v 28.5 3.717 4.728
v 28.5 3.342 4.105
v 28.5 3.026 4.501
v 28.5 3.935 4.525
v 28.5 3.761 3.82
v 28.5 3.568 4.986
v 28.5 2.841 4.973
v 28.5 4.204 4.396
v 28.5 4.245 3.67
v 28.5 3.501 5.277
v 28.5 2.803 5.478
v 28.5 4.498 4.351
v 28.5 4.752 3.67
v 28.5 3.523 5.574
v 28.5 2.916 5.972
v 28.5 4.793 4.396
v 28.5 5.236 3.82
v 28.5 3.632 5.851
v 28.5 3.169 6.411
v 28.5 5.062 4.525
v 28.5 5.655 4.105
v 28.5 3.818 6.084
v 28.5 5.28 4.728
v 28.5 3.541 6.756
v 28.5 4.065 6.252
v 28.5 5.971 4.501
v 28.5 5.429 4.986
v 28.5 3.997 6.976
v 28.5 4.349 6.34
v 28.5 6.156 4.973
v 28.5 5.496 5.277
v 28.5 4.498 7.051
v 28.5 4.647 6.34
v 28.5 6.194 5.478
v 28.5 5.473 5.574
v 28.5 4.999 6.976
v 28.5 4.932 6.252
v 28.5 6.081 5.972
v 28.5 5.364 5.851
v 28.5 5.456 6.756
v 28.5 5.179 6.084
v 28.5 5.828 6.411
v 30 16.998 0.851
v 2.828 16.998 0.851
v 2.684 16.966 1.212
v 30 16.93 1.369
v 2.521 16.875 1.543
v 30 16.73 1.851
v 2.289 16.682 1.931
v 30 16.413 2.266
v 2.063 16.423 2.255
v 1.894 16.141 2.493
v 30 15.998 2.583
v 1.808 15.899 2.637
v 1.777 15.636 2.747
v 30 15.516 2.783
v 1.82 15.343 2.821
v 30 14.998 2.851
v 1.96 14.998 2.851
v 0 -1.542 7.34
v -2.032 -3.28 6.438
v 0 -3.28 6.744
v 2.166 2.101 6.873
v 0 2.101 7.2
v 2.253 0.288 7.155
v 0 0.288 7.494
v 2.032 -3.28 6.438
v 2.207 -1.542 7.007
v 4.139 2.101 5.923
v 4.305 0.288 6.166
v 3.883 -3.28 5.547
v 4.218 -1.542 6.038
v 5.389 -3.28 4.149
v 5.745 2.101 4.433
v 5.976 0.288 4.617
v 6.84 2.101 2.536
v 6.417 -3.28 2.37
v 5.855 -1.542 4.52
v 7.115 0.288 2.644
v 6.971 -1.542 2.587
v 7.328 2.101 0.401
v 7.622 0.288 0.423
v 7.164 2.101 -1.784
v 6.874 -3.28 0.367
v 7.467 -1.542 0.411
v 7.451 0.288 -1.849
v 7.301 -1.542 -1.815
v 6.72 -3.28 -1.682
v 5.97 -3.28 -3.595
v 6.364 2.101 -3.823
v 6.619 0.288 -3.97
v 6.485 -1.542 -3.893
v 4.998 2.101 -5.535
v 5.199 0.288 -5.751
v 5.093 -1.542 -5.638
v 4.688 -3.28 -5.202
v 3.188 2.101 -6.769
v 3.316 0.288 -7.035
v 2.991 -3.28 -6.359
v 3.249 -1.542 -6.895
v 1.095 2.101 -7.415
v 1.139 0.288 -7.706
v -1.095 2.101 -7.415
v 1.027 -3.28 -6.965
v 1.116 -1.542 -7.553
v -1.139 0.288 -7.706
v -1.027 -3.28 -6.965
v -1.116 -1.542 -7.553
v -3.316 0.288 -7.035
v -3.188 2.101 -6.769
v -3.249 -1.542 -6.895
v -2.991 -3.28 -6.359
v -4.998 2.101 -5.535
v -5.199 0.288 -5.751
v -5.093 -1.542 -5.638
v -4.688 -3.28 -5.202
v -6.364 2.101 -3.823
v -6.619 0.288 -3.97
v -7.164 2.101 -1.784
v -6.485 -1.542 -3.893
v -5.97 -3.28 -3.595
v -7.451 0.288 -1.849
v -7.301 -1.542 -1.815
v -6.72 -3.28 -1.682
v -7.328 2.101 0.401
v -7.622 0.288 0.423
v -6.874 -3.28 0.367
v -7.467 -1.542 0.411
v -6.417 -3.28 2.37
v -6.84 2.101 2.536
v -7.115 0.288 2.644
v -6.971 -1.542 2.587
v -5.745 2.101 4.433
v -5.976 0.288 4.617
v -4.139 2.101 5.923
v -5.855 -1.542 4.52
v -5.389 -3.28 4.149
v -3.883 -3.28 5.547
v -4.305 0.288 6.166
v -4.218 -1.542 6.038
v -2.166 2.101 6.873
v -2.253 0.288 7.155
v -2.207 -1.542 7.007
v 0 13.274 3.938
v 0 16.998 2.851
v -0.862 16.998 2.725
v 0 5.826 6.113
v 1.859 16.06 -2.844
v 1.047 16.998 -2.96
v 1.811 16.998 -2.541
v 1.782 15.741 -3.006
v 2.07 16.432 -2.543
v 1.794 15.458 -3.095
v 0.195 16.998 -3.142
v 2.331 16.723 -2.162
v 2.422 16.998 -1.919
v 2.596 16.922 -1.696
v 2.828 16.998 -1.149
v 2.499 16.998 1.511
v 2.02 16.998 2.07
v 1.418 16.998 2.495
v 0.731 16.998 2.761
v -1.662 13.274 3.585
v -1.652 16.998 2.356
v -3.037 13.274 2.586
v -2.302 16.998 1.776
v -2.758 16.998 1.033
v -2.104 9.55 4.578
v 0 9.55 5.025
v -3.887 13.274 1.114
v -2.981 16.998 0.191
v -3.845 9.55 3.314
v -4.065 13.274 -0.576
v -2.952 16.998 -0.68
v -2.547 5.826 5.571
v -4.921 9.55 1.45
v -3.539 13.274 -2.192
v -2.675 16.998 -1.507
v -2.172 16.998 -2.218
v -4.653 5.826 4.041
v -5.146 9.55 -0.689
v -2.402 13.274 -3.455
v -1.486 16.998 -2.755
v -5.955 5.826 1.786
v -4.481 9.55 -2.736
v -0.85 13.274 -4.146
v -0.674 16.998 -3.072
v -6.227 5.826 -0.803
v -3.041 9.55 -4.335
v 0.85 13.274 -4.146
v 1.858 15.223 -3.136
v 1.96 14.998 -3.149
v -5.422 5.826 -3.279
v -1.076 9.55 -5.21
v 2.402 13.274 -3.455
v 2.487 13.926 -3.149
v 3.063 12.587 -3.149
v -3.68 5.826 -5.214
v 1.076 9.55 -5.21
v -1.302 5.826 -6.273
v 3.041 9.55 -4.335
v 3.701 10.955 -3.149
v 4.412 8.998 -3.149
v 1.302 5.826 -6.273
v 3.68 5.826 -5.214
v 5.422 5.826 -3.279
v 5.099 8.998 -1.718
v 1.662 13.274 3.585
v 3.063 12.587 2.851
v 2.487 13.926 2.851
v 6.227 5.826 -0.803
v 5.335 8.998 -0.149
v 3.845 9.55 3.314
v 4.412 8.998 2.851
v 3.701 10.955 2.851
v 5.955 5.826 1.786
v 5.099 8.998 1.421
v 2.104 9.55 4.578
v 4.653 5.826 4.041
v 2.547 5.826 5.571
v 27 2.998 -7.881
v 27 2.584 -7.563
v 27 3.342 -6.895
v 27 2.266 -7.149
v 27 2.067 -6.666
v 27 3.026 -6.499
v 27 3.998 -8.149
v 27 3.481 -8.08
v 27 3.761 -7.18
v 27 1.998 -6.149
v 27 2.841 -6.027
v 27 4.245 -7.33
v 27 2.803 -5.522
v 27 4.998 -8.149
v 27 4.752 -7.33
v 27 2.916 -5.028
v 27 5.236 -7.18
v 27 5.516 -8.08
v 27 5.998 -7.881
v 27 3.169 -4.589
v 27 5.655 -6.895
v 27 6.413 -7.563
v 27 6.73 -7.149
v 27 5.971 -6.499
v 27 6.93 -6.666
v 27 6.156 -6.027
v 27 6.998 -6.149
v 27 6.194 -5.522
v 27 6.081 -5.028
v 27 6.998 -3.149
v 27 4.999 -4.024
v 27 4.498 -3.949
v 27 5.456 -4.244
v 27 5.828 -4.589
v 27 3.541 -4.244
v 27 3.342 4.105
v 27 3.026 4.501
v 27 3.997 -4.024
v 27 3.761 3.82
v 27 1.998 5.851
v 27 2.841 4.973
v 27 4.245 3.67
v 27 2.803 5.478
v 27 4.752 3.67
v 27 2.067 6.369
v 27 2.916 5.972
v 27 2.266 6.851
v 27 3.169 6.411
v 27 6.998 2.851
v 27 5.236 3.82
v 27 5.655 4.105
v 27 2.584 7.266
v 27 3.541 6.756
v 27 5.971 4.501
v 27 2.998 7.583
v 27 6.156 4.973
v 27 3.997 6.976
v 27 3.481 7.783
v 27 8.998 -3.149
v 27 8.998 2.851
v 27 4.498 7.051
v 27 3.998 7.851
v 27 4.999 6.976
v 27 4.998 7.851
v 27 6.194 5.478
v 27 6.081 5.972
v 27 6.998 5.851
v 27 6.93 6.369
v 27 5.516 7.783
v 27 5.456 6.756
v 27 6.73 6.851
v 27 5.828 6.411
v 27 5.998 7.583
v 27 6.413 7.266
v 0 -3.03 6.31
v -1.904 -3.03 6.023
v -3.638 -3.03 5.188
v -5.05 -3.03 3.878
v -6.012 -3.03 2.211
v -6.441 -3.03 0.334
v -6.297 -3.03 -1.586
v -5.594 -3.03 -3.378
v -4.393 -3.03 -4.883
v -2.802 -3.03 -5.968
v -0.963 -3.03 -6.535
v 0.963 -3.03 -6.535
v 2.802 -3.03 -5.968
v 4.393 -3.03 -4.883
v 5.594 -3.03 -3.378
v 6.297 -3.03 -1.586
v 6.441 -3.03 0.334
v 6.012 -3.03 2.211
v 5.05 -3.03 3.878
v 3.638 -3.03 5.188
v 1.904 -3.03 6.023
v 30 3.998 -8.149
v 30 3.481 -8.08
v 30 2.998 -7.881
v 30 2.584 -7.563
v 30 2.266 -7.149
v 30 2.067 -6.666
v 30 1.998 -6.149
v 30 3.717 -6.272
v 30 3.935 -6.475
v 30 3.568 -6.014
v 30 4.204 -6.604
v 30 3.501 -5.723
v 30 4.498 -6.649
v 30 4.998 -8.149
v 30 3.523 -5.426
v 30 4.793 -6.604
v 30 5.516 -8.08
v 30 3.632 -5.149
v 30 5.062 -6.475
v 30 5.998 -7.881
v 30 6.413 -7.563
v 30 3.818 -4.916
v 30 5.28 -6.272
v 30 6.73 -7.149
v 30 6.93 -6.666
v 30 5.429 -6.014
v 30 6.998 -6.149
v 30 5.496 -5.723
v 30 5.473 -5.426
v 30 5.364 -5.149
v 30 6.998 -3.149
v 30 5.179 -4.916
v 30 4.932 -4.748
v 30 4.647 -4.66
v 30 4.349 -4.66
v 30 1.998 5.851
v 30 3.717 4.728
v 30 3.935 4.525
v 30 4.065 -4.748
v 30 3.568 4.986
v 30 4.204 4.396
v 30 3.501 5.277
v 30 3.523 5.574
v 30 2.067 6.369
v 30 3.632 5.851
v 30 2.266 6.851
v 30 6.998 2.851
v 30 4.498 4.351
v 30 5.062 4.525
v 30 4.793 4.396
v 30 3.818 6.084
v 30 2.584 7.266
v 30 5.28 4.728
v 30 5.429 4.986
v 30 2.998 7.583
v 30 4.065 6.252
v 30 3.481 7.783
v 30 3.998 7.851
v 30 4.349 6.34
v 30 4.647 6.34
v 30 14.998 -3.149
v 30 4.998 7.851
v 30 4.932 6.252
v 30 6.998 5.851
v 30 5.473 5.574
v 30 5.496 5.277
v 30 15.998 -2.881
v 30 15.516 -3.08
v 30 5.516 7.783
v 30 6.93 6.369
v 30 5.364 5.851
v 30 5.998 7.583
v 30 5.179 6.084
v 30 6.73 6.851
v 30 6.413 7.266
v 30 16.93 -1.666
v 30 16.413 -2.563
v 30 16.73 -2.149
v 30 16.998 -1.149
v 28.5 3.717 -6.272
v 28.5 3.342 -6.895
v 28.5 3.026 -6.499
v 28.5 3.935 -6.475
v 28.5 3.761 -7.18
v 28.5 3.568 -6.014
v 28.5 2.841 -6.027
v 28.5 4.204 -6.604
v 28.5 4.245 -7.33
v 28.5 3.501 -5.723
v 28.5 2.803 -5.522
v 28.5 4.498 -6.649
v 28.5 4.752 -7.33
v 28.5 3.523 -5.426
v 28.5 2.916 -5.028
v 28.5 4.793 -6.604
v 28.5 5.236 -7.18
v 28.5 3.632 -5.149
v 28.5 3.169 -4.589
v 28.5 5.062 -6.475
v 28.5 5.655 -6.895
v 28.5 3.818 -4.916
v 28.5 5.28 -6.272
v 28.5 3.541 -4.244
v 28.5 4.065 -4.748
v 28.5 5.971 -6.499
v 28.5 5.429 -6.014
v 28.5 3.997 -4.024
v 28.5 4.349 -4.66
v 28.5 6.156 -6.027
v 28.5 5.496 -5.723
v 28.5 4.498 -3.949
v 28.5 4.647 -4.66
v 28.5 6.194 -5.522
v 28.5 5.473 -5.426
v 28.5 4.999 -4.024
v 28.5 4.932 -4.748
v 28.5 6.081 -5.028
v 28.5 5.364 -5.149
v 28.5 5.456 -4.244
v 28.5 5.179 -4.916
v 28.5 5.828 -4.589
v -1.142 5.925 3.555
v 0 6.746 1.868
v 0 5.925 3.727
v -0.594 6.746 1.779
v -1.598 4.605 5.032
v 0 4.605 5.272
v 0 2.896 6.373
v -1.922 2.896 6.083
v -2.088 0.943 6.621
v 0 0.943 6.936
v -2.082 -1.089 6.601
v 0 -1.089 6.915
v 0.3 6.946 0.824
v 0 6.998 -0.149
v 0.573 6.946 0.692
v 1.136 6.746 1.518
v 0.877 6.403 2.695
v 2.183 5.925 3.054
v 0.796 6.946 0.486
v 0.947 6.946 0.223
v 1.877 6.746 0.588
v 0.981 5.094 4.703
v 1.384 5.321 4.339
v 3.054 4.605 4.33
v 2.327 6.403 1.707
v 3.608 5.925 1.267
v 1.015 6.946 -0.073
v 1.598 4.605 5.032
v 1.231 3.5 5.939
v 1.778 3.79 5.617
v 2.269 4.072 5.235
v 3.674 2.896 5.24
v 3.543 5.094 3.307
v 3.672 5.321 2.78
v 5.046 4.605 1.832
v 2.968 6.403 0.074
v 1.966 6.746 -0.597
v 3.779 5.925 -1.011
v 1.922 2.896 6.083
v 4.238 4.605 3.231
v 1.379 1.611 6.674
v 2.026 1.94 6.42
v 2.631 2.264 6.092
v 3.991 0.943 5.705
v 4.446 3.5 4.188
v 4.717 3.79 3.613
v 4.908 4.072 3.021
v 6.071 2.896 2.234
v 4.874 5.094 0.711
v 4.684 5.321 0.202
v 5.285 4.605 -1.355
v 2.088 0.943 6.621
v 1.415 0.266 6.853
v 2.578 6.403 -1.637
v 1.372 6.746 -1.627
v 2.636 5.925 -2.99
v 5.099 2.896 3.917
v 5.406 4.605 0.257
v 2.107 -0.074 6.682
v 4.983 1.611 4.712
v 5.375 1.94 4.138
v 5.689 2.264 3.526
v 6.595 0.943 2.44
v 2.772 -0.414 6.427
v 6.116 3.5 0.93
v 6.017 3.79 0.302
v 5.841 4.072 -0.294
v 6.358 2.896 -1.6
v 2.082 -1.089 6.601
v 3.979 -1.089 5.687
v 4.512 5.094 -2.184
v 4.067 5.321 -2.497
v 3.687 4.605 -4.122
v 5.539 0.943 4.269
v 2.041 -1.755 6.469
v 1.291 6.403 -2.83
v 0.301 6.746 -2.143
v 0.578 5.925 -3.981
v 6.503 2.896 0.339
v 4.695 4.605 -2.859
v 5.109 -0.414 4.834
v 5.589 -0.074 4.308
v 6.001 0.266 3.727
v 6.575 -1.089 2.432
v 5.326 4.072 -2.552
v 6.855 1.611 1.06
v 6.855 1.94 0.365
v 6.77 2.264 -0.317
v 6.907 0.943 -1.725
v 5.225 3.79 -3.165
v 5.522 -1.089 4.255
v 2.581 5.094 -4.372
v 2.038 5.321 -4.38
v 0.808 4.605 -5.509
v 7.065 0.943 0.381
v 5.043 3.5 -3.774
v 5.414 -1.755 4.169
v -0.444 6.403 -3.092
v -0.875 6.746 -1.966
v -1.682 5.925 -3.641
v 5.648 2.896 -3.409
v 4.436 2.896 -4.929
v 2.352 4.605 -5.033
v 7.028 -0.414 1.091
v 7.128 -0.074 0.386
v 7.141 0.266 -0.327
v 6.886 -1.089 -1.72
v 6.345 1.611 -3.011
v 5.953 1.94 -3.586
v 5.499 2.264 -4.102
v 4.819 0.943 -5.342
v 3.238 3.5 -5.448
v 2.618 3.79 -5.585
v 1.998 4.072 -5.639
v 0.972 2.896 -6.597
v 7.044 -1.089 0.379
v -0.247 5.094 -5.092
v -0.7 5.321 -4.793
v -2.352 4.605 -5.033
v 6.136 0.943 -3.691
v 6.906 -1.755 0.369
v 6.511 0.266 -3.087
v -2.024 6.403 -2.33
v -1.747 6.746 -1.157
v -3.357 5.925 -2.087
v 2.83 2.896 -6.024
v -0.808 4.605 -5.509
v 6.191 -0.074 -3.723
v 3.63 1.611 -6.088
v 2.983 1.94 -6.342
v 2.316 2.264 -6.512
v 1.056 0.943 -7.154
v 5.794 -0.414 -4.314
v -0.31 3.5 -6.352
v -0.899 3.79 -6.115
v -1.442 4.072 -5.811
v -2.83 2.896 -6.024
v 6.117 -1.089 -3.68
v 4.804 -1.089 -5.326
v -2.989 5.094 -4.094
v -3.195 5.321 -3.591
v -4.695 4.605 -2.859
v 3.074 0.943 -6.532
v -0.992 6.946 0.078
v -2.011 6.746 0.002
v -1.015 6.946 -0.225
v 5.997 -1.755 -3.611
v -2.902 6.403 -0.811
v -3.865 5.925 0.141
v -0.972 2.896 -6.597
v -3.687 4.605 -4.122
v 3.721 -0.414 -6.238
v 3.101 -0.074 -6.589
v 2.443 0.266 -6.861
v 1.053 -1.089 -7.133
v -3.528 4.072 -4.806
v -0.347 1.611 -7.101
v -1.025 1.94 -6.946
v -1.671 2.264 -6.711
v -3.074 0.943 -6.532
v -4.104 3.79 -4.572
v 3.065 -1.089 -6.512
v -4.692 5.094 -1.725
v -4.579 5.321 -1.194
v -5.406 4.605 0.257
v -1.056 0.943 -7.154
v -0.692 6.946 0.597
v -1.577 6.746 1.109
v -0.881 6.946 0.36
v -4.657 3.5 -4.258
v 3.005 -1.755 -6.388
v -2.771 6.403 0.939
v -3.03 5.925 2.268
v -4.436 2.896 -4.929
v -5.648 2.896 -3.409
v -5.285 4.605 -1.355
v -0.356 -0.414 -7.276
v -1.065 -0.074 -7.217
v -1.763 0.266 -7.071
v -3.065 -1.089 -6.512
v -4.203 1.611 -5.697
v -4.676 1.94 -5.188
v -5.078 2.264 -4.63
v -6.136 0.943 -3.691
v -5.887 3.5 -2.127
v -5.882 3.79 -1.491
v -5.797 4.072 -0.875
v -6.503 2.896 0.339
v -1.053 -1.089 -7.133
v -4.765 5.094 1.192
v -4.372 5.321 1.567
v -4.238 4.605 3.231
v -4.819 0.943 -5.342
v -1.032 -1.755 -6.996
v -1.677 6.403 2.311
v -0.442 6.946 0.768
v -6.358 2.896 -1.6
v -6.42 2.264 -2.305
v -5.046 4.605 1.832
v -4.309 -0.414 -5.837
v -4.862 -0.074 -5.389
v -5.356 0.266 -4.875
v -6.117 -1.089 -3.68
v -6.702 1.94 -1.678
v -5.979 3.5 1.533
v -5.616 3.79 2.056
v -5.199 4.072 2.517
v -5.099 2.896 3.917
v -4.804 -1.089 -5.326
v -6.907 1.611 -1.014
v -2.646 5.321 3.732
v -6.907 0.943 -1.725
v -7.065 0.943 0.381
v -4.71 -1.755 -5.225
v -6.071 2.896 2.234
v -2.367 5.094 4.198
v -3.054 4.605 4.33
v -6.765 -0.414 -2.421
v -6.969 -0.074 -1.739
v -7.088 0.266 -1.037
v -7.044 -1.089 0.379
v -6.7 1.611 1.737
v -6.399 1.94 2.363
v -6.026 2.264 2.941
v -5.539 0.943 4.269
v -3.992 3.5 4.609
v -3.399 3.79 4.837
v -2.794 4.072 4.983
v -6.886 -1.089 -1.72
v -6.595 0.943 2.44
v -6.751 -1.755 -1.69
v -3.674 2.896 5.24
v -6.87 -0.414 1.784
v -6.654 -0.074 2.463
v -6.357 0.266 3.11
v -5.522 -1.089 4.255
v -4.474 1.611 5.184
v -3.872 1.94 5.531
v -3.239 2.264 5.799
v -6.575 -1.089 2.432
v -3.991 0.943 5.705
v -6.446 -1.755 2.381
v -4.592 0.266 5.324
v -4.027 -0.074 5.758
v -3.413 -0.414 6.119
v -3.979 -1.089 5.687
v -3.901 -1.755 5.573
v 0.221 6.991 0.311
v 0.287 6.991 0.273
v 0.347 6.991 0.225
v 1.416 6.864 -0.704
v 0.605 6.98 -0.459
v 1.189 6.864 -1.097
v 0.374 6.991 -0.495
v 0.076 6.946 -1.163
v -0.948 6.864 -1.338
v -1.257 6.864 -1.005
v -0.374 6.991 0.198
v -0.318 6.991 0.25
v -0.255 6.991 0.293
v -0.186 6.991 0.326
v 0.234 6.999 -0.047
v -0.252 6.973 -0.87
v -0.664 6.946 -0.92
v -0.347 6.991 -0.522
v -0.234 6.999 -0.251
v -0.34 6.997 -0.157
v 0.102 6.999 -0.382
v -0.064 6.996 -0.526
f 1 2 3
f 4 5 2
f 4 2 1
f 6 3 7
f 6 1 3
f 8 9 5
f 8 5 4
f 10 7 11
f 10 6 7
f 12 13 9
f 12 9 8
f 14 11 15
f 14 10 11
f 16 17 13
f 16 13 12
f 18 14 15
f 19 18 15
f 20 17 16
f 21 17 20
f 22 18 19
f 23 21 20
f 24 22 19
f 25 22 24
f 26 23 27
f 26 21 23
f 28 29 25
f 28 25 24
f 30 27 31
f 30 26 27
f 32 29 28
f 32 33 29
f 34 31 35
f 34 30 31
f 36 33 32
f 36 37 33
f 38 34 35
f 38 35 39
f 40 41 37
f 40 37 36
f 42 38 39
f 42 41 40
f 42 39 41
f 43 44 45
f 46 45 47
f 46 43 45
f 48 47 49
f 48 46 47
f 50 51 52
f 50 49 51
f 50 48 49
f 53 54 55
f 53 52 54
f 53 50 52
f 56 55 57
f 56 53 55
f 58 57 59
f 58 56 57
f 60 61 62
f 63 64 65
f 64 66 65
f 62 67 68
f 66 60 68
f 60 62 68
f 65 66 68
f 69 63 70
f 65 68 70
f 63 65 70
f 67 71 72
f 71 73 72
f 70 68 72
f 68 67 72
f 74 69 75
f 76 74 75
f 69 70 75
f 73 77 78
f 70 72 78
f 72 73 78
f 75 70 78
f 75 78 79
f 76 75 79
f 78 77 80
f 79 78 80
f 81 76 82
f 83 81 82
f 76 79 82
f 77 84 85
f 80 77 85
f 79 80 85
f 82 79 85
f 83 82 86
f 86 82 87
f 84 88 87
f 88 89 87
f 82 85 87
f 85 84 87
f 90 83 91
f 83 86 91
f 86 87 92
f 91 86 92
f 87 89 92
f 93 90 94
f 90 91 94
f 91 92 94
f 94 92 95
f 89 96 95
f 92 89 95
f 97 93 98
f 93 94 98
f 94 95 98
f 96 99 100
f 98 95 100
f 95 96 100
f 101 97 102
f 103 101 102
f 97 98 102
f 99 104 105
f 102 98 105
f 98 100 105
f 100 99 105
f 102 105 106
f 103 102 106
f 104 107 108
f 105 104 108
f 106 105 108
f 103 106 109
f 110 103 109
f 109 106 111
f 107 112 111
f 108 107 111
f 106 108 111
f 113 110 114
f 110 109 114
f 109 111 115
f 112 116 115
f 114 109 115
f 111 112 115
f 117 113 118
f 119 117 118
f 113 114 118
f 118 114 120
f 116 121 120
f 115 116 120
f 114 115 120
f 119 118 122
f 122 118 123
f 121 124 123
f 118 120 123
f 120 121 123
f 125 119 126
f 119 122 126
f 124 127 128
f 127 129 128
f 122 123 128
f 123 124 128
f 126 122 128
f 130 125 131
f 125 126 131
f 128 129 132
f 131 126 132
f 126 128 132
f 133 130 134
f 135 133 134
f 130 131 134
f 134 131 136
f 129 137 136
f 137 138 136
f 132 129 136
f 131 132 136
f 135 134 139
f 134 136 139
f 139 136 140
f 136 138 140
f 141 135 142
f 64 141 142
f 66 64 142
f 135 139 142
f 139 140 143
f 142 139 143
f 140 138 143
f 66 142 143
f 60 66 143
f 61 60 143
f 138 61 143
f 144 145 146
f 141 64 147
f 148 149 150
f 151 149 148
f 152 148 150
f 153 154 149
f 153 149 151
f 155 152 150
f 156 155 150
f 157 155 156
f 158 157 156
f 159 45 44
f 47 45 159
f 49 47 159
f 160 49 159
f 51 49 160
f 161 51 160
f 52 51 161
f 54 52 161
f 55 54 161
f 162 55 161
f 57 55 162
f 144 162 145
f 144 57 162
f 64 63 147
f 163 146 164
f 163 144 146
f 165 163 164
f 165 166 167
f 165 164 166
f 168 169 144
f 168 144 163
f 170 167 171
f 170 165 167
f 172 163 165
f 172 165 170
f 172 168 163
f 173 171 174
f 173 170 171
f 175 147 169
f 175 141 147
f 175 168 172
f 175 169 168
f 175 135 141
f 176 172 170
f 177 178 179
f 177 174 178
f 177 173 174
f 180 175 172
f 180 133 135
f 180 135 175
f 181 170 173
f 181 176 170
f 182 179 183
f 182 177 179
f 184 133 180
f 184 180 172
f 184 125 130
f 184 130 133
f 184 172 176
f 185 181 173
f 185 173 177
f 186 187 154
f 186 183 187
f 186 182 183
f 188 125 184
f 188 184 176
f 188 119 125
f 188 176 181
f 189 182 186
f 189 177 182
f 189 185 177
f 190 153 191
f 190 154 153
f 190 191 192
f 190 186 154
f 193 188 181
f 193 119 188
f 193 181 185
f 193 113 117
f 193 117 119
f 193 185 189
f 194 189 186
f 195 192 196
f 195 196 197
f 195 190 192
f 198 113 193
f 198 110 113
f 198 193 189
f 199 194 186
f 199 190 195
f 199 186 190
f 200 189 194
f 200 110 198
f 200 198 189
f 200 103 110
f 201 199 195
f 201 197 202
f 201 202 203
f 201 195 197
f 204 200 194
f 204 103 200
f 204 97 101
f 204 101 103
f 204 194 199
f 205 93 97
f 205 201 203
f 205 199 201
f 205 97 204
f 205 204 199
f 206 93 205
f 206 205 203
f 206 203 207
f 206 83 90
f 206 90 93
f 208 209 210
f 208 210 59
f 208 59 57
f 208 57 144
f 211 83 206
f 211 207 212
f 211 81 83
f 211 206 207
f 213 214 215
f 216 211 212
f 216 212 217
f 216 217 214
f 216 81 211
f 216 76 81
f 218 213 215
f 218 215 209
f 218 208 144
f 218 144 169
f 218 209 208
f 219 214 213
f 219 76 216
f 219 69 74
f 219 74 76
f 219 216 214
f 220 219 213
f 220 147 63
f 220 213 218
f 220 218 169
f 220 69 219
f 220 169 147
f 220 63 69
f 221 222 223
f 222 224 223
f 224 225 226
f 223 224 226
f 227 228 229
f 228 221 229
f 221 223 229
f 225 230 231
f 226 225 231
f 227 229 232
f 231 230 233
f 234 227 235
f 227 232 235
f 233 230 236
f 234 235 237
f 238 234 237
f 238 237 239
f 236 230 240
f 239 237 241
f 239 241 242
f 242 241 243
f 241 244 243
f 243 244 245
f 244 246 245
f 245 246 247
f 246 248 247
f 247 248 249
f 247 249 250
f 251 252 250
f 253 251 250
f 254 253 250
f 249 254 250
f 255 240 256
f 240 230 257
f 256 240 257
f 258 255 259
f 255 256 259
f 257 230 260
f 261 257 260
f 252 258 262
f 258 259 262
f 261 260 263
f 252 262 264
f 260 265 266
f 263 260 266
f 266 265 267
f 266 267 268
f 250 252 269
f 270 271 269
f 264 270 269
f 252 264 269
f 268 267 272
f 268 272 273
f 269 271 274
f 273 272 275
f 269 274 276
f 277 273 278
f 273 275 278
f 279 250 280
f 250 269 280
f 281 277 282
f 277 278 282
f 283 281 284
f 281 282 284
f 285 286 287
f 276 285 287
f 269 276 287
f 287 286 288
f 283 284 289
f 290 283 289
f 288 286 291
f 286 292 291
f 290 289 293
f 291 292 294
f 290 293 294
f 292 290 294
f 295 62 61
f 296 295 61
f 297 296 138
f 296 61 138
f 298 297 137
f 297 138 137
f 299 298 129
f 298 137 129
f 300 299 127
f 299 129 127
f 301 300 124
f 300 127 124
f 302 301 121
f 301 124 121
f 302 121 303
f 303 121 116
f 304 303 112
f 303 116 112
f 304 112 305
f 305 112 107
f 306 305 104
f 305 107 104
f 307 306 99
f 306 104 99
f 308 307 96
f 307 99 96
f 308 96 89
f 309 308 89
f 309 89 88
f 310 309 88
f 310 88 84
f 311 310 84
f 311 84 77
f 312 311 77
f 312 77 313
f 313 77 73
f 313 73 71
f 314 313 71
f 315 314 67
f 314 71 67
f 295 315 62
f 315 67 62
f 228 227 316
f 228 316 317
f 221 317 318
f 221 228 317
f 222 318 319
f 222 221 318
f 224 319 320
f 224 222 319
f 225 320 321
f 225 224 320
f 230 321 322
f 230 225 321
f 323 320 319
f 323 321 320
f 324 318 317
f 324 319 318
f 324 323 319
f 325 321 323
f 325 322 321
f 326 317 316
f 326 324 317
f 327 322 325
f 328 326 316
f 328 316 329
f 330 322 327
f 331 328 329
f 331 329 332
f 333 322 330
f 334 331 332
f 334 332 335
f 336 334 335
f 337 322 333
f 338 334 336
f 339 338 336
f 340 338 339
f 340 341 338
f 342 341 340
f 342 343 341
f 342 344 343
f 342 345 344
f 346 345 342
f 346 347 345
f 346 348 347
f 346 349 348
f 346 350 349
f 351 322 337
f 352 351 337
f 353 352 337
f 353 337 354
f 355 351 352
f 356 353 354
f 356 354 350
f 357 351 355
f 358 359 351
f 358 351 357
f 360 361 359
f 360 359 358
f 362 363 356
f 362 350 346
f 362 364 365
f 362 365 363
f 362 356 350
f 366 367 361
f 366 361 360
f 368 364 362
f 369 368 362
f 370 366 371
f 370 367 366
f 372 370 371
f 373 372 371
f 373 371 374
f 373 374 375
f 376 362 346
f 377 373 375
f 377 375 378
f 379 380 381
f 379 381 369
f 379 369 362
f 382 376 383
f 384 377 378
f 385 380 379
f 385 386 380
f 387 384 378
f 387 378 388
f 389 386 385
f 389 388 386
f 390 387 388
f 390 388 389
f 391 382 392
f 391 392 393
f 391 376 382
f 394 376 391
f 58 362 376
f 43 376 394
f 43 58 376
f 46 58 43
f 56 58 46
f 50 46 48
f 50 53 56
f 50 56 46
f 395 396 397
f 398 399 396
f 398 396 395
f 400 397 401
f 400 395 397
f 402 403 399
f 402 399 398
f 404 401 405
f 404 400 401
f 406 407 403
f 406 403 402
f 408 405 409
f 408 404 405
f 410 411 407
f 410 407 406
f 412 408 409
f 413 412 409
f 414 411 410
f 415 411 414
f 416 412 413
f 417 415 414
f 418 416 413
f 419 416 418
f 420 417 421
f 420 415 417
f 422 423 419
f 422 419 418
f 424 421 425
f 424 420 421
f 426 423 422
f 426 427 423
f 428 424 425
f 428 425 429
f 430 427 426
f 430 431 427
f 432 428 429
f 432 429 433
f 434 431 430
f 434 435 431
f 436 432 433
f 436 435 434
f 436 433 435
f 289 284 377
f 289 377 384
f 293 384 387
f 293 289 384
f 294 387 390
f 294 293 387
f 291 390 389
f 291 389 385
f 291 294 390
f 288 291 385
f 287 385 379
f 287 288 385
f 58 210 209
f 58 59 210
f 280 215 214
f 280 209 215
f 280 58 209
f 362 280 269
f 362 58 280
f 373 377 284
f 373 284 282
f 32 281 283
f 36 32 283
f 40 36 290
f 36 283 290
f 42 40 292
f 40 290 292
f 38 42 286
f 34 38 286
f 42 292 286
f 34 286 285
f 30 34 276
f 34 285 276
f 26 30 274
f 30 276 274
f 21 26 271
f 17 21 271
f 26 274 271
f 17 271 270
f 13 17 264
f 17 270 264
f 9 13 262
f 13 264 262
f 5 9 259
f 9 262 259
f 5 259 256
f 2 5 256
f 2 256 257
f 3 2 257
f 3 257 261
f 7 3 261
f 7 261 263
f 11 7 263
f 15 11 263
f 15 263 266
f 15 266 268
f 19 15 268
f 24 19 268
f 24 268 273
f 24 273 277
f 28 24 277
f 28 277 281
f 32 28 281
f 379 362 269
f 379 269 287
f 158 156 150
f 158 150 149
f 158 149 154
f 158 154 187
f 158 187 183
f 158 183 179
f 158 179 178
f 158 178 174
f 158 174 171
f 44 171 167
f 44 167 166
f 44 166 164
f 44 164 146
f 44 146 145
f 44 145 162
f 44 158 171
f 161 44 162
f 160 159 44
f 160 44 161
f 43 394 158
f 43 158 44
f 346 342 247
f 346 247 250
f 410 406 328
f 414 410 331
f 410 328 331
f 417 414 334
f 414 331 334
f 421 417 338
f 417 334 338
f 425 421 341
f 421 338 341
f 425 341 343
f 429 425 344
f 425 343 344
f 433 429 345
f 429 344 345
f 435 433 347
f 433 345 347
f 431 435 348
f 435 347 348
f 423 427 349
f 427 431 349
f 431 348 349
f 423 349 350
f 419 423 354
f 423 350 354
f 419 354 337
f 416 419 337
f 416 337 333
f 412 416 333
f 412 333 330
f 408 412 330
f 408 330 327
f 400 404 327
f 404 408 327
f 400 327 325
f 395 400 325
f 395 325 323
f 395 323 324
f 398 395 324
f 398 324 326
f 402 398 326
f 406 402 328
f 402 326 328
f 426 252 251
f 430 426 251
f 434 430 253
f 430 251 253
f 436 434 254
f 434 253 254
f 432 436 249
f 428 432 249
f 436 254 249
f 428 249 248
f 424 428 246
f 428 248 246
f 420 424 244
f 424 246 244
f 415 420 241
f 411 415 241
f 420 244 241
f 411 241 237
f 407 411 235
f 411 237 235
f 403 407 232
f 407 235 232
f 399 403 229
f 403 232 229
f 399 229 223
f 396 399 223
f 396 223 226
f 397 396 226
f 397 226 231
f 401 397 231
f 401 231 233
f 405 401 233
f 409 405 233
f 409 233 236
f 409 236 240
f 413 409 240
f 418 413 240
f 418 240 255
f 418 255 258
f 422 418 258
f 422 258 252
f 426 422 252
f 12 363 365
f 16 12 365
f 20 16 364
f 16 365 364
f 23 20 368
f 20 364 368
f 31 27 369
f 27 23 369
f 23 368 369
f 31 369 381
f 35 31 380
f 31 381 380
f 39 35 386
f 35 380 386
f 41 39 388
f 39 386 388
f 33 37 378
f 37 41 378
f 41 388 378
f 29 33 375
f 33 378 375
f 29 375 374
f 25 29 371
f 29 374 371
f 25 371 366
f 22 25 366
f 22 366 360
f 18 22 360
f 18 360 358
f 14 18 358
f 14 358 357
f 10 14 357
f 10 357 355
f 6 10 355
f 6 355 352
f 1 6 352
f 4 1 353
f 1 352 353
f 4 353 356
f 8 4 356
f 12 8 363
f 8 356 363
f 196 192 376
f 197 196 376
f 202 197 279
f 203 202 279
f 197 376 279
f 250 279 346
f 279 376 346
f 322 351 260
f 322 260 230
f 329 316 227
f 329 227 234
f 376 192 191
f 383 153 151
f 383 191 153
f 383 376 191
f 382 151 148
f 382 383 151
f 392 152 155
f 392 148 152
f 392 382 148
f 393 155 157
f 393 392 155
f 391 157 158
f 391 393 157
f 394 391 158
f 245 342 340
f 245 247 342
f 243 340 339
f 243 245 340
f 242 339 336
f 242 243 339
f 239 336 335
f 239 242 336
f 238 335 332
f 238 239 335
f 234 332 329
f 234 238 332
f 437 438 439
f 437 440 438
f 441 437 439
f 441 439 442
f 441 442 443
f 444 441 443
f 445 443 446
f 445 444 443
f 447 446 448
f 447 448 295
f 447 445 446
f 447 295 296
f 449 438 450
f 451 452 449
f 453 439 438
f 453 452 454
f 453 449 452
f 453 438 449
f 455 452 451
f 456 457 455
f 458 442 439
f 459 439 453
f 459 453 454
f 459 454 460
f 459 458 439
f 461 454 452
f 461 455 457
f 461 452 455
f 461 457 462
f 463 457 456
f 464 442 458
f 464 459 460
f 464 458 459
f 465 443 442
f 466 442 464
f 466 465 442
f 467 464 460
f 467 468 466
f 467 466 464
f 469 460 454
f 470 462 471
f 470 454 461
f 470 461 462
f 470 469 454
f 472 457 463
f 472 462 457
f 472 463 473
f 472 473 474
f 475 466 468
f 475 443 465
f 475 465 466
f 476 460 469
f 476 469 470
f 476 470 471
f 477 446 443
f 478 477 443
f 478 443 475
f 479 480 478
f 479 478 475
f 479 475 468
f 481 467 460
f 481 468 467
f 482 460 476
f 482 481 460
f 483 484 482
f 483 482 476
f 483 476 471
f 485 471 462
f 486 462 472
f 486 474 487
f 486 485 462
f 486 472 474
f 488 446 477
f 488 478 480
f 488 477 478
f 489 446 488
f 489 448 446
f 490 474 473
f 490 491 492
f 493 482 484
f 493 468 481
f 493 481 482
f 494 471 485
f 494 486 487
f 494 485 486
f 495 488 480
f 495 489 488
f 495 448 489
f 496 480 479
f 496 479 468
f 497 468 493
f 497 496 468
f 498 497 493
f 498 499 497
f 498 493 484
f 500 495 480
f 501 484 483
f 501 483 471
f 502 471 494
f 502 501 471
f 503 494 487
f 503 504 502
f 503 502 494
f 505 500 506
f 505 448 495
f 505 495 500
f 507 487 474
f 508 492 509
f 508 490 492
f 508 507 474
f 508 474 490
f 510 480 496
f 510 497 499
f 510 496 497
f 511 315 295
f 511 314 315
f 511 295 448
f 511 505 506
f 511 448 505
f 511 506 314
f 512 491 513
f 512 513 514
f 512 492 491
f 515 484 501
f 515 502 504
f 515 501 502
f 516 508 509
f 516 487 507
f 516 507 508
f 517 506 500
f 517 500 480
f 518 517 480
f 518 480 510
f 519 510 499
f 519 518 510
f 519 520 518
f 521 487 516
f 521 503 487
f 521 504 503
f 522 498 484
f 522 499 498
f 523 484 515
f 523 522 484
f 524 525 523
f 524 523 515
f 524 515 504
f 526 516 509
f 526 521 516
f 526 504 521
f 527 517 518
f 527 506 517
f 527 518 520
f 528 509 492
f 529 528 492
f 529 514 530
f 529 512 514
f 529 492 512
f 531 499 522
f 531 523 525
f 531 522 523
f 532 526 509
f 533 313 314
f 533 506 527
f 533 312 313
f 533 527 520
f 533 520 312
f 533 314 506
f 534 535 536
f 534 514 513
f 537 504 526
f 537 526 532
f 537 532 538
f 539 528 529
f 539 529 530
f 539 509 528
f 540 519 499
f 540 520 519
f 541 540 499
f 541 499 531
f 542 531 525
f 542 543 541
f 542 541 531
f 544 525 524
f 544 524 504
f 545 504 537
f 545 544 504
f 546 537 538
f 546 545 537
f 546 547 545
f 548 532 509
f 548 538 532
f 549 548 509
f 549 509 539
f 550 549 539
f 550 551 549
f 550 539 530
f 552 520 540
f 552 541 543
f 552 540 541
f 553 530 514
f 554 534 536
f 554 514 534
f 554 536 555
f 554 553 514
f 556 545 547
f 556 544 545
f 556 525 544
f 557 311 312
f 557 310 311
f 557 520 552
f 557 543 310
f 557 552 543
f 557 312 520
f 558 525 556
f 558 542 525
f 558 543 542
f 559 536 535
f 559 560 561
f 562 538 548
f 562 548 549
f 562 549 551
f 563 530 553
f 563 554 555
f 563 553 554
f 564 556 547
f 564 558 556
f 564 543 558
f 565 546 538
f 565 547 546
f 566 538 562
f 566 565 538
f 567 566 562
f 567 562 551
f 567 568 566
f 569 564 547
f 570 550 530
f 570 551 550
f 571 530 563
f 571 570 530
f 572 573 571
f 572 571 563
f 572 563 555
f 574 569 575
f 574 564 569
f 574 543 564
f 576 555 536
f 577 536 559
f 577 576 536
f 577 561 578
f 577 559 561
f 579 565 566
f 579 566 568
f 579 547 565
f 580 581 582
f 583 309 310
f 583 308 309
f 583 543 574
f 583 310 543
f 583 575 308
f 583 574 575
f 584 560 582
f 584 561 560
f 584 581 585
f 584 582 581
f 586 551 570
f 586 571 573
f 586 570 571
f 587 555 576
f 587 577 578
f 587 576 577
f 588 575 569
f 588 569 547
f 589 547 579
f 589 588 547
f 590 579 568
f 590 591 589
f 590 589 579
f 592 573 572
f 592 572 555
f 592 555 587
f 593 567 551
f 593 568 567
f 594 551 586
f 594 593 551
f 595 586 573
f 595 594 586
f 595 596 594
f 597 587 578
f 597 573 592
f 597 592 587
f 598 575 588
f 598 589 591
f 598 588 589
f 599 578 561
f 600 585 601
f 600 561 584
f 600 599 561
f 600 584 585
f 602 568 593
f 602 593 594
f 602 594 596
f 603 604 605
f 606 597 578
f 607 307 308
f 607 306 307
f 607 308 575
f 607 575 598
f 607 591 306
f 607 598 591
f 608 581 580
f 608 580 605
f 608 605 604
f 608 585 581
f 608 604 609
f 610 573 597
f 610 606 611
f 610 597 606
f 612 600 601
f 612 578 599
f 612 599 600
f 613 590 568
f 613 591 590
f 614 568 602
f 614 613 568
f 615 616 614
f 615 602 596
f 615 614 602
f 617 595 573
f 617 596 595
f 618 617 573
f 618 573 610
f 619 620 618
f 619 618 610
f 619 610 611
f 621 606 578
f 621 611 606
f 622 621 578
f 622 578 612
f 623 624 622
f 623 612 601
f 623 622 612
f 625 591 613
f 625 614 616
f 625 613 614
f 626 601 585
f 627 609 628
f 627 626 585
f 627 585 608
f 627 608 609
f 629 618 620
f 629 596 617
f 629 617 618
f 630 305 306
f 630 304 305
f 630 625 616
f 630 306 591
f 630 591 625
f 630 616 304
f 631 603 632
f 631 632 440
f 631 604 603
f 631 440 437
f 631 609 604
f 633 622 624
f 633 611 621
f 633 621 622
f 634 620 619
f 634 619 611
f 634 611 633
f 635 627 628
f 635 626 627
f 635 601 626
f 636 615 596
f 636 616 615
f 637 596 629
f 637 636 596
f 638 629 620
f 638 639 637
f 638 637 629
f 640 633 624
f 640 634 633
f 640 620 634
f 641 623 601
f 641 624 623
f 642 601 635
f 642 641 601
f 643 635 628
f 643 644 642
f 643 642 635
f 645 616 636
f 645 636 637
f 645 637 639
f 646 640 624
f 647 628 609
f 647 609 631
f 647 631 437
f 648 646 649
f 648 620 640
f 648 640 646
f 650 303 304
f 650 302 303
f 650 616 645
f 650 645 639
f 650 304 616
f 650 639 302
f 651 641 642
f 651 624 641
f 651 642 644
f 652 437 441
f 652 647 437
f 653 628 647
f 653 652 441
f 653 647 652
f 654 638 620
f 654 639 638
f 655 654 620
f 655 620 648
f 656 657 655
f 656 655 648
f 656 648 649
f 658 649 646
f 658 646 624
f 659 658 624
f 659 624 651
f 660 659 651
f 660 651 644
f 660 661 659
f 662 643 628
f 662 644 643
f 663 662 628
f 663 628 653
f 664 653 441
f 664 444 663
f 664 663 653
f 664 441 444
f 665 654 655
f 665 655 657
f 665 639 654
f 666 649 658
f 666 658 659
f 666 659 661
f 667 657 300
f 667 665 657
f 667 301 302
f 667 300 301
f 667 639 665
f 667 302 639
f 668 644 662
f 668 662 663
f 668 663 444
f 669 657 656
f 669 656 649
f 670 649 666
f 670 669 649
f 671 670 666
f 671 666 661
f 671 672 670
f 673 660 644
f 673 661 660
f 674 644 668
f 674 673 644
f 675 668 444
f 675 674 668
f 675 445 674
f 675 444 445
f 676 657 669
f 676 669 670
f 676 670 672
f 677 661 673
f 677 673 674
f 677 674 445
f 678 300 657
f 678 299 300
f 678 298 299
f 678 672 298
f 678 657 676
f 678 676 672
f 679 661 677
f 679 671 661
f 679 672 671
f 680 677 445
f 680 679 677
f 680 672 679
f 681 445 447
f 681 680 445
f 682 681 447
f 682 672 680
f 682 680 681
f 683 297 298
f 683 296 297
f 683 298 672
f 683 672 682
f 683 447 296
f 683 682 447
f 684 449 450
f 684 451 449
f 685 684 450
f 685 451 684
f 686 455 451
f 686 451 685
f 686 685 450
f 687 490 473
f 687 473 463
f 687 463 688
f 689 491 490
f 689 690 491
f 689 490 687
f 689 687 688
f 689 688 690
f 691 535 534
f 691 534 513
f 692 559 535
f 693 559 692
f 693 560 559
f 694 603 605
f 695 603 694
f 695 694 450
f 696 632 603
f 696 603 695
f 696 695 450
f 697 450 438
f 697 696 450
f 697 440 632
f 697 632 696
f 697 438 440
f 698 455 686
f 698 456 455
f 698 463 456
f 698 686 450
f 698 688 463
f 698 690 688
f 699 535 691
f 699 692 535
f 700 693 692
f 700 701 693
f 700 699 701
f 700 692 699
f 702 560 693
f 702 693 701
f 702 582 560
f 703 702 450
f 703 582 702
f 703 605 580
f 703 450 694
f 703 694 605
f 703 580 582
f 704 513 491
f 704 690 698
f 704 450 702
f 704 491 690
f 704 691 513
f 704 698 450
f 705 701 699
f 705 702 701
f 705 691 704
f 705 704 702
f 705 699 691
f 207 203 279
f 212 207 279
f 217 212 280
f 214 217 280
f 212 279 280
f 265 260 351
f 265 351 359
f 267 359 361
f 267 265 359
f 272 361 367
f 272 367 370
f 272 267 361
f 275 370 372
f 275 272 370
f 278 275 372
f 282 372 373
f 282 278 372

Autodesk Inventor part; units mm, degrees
ref_plane "XZ Plane" through (0, 0, 0) normal (0, 1, 0) x (-1, 0, 0)
ref_plane "XY Plane" through (0, 0, 0) normal (0, 0, 1) x (1, 0, 0)
sketch "Sketch1" plane through (0, 0, 0) normal (1, 0, 0) x (0, 1, 0)
  arc A0 (7.4985, -0.1486) -> (-3.2805, 6.7445) centre (0, 0) ccw
  line L0 (0, 0) -> (-1.75, 0)
  line L1 (-1.75, 0) -> (-1.75, -0.1486)
  line L2 (-1.75, -4.1458) -> (-0.74, -4.1458) construction
  line L3 (-3.2805, 6.7445) -> (-3.0298, 6.3103)
  line L4 (-3.2805, 6.7445) -> (-2.7791, 6.7445) construction
  line L5 (6.9984, -0.1486) -> (16.9984, -0.1486)
  line L6 (16.9984, -0.1486) -> (16.9984, 2.8514)
  line L7 (16.9984, 2.8514) -> (1.2284, 7.4544)
  arc A1 (6.9984, -0.1486) -> (-3.0298, 6.3103) centre (0, 0) ccw
  point P0 (2.1014, 7.1996)
  dimension "d1" = 15
  dimension "d2" = 1.75
  dimension "d4" = 60
  dimension "d5" = 10
  dimension "d6" = 3
  dimension "d8" = 7
revolve "Revolution1" add sketch "Sketch1" angle 360 about axis through (0, 6.9984, -0.1486) along (0, 1, 0)
ref_plane "Work Plane1" through (30, 0, 0) normal (1, 0, 0) x (0, 1, 0)
sketch "Sketch2" plane through (30, 0, 0) normal (1, 0, 0) x (0, 1, 0)
  line L0 (16.9984, -3.1486) -> (16.9984, 2.8514) projected
  line L1 (14.9984, 2.8514) -> (6.9984, 2.8514)
  line L2 (14.9984, -3.1486) -> (6.9984, -3.1486)
  line L3 (16.9984, 0.8514) -> (16.9984, -1.1486)
  arc A0 (16.9984, 0.8514) -> (14.9984, 2.8514) centre (14.9984, 0.8514) ccw
  arc A1 (14.9984, -3.1486) -> (16.9984, -1.1486) centre (14.9984, -1.1486) ccw
  line L4 (6.9984, 2.8514) -> (6.9984, 7.8514)
  line L5 (6.9984, 7.8514) -> (1.9984, 7.8514)
  line L6 (1.9984, 7.8514) -> (1.9984, -8.1486)
  line L7 (2.1014, -7.4967) -> (2.1014, 7.1996) projected
  line L8 (1.9984, 7.8514) -> (17.9984, 7.8514) construction
  line L9 (1.9984, -8.1486) -> (6.9984, -8.1486)
  line L10 (6.9984, -8.1486) -> (6.9984, -3.1486)
  point P0 (0, 0)
  dimension "d10" = 10
  dimension "d11" = 10
  dimension "d12" = 2
  dimension "d13" = 5
  dimension "d14" = 5
  dimension "d15" = 16
  dimension "d16" = 90
  dimension "d17" = 5
extrude "Extrusion1" add sketch "Sketch2" against normal blind 3
sketch "Sketch3" plane through (27, 0, 0) normal (-1, 0, 0) x (0, 0, 1)
  line L0 (0.8514, 16.9984) -> (-1.1486, 16.9984) projected
  line L1 (-0.1486, 16.9984) -> (-0.1486, 8.9984)
  line L2 (-0.1486, 8.9984) -> (-3.1486, 8.9984)
  line L3 (-3.1486, 14.9984) -> (-3.1486, 6.9984) projected
  line L4 (-0.1486, 8.9984) -> (2.8514, 8.9984)
  line L5 (2.8514, 6.9984) -> (2.8514, 14.9984) projected
  arc A0 (2.8514, 14.9984) -> (0.8514, 16.9984) centre (0.8514, 14.9984) ccw projected
  arc A1 (-1.1486, 16.9984) -> (-3.1486, 14.9984) centre (-1.1486, 14.9984) ccw projected
  point P0 (0, 0)
  dimension "d20" = 8
extrude "Extrusion2" add sketch "Sketch3" along normal up to surface
fillet "Fillet1" radius 2 4 edges at (28.5, 1.9984, -8.1486) (28.5, 6.9984, -8.1486) (28.5, 1.9984, 7.8514) (28.5, 6.9984, 7.8514)
sketch "Sketch4" plane through (30, 0, 0) normal (1, 0, 0) x (0, 0, -1)
  line L0 (8.1486, 4.9984) -> (8.1486, 3.9984) projected
  line L1 (8.1486, 4.4984) -> (5.6486, 4.4984)
  circle A0 centre (5.6486, 4.4984) radius 1
  line L2 (-7.8514, 4.9984) -> (-7.8514, 3.9984) projected
  line L3 (-7.8514, 4.4984) -> (-5.3514, 4.4984)
  circle A1 centre (-5.3514, 4.4984) radius 1
  point P0 (0, 0)
  dimension "d24" = 2.5
  dimension "d25" = 2
  dimension "d26" = 2.5
  dimension "d27" = 2
extrude "Extrusion3" cut sketch "Sketch4" against normal up to surface (3 mm away)
sketch "Sketch5" plane through (27, 0, 0) normal (-1, 0, 0) x (0, 0, 1)
  circle A0 centre (5.3514, 4.4984) radius 1 projected
  circle A1 centre (-5.6486, 4.4984) radius 1 projected
  circle A2 centre (-5.6486, 4.4984) radius 1.7
  circle A3 centre (5.3514, 4.4984) radius 1.7
  point P0 (0, 0)
  dimension "d30" = 3.4
  dimension "d31" = 3.4
extrude "Extrusion4" cut sketch "Sketch5" against normal blind 1.5
equation "\"d21\" = d20"
properties part number "BallFemale"
